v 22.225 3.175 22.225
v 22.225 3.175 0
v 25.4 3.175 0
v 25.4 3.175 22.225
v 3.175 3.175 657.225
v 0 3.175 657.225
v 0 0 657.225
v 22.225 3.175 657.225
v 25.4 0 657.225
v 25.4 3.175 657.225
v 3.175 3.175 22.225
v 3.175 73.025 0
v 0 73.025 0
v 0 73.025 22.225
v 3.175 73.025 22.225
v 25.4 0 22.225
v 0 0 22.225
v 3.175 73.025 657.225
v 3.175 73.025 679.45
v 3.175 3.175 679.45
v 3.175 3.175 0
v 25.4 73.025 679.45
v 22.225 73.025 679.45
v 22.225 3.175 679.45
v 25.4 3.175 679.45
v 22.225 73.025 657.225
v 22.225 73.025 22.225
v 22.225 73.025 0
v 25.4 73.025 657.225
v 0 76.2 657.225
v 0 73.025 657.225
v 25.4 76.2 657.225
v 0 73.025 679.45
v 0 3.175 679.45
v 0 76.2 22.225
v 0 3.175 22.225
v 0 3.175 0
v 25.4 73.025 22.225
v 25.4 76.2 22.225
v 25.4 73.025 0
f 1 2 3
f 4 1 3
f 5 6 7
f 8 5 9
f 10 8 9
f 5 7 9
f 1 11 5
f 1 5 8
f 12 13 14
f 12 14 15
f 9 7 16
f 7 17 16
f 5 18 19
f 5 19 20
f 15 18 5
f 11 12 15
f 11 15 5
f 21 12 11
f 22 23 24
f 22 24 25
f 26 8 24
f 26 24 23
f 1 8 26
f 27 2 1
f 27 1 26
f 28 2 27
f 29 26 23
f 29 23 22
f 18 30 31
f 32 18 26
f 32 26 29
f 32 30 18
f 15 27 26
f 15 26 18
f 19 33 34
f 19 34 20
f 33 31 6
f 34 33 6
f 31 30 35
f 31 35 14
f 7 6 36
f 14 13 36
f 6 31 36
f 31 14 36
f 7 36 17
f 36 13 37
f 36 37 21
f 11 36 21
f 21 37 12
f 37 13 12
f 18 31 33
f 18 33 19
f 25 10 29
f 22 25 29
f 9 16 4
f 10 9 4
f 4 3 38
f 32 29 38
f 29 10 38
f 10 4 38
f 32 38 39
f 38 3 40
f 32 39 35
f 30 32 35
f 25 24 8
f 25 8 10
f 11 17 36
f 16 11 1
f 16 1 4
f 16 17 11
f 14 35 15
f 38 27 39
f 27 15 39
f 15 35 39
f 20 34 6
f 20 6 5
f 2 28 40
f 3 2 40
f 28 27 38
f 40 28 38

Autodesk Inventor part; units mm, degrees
ref_plane "YZ Plane" through (0, 0, 0) normal (1, 0, 0) x (0, 1, 0)
ref_plane "XZ Plane" through (0, 0, 0) normal (0, 1, 0) x (-1, 0, 0)
ref_plane "XY Plane" through (0, 0, 0) normal (0, 0, 1) x (1, 0, 0)
sketch "Sketch1" plane through (0, 0, 0) normal (0, 0, 1) x (1, 0, 0)
  line L0 (0, 0) -> (25.4, 0)
  line L1 (25.4, 0) -> (25.4, 76.2)
  line L2 (25.4, 76.2) -> (0, 76.2)
  line L3 (0, 76.2) -> (0, 0)
  line L4 (3.175, 3.175) -> (22.225, 3.175)
  line L5 (22.225, 3.175) -> (22.225, 73.025)
  line L6 (22.225, 73.025) -> (3.175, 73.025)
  line L7 (3.175, 73.025) -> (3.175, 3.175)
  dimension "d0" = 25.4
  dimension "d1" = 76.2
  dimension "d2" = 3.175
  dimension "d3" = 3.175
  dimension "d4" = 3.175
  dimension "d5" = 3.175
extrude "Extrusion1" add sketch "Sketch1" along normal blind 679.45
sketch "Sketch2" plane through (0, 76.2, 0) normal (0, 1, 0) x (1, 0, 0)
  line L0 (0, -679.45) -> (25.4, -679.45) projected
  line L1 (25.4, 0) -> (25.4, -679.45) projected
  line L2 (25.4, 0) -> (0, 0) projected
  line L3 (0, 0) -> (0, -679.45) projected
  line L4 (0, -22.225) -> (25.4, -22.225)
  line L5 (0, -657.225) -> (25.4, -657.225)
  dimension "d8" = 22.225
  dimension "d9" = 22.225
extrude "Extrusion2" cut sketch "Sketch2" against normal blind 3.175 contours L3 L5 L1 L0 | L3 L2 L1 L4
sketch "Sketch3" plane through (0, 0, 0) normal (0, -1, 0) x (1, 0, 0)
  line L0 (25.4, 679.45) -> (0, 679.45) projected
  line L1 (0, 0) -> (0, 679.45) projected
  line L2 (0, 0) -> (25.4, 0) projected
  line L3 (25.4, 0) -> (25.4, 679.45) projected
  line L4 (0, 657.225) -> (25.4, 657.225)
  line L5 (0, 22.225) -> (25.4, 22.225)
  dimension "d12" = 22.225
  dimension "d13" = 22.225
extrude "Extrusion3" cut sketch "Sketch3" against normal blind 3.175 contours L3 L4 L1 L0 | L3 L2 L1 L5
equation "\"d3\" = d2"
equation "\"d4\" = d3"
equation "\"d5\" = d4"
equation "\"d9\" = d8"
equation "\"d13\" = d12"
properties part number "frame box 1 by 3"
